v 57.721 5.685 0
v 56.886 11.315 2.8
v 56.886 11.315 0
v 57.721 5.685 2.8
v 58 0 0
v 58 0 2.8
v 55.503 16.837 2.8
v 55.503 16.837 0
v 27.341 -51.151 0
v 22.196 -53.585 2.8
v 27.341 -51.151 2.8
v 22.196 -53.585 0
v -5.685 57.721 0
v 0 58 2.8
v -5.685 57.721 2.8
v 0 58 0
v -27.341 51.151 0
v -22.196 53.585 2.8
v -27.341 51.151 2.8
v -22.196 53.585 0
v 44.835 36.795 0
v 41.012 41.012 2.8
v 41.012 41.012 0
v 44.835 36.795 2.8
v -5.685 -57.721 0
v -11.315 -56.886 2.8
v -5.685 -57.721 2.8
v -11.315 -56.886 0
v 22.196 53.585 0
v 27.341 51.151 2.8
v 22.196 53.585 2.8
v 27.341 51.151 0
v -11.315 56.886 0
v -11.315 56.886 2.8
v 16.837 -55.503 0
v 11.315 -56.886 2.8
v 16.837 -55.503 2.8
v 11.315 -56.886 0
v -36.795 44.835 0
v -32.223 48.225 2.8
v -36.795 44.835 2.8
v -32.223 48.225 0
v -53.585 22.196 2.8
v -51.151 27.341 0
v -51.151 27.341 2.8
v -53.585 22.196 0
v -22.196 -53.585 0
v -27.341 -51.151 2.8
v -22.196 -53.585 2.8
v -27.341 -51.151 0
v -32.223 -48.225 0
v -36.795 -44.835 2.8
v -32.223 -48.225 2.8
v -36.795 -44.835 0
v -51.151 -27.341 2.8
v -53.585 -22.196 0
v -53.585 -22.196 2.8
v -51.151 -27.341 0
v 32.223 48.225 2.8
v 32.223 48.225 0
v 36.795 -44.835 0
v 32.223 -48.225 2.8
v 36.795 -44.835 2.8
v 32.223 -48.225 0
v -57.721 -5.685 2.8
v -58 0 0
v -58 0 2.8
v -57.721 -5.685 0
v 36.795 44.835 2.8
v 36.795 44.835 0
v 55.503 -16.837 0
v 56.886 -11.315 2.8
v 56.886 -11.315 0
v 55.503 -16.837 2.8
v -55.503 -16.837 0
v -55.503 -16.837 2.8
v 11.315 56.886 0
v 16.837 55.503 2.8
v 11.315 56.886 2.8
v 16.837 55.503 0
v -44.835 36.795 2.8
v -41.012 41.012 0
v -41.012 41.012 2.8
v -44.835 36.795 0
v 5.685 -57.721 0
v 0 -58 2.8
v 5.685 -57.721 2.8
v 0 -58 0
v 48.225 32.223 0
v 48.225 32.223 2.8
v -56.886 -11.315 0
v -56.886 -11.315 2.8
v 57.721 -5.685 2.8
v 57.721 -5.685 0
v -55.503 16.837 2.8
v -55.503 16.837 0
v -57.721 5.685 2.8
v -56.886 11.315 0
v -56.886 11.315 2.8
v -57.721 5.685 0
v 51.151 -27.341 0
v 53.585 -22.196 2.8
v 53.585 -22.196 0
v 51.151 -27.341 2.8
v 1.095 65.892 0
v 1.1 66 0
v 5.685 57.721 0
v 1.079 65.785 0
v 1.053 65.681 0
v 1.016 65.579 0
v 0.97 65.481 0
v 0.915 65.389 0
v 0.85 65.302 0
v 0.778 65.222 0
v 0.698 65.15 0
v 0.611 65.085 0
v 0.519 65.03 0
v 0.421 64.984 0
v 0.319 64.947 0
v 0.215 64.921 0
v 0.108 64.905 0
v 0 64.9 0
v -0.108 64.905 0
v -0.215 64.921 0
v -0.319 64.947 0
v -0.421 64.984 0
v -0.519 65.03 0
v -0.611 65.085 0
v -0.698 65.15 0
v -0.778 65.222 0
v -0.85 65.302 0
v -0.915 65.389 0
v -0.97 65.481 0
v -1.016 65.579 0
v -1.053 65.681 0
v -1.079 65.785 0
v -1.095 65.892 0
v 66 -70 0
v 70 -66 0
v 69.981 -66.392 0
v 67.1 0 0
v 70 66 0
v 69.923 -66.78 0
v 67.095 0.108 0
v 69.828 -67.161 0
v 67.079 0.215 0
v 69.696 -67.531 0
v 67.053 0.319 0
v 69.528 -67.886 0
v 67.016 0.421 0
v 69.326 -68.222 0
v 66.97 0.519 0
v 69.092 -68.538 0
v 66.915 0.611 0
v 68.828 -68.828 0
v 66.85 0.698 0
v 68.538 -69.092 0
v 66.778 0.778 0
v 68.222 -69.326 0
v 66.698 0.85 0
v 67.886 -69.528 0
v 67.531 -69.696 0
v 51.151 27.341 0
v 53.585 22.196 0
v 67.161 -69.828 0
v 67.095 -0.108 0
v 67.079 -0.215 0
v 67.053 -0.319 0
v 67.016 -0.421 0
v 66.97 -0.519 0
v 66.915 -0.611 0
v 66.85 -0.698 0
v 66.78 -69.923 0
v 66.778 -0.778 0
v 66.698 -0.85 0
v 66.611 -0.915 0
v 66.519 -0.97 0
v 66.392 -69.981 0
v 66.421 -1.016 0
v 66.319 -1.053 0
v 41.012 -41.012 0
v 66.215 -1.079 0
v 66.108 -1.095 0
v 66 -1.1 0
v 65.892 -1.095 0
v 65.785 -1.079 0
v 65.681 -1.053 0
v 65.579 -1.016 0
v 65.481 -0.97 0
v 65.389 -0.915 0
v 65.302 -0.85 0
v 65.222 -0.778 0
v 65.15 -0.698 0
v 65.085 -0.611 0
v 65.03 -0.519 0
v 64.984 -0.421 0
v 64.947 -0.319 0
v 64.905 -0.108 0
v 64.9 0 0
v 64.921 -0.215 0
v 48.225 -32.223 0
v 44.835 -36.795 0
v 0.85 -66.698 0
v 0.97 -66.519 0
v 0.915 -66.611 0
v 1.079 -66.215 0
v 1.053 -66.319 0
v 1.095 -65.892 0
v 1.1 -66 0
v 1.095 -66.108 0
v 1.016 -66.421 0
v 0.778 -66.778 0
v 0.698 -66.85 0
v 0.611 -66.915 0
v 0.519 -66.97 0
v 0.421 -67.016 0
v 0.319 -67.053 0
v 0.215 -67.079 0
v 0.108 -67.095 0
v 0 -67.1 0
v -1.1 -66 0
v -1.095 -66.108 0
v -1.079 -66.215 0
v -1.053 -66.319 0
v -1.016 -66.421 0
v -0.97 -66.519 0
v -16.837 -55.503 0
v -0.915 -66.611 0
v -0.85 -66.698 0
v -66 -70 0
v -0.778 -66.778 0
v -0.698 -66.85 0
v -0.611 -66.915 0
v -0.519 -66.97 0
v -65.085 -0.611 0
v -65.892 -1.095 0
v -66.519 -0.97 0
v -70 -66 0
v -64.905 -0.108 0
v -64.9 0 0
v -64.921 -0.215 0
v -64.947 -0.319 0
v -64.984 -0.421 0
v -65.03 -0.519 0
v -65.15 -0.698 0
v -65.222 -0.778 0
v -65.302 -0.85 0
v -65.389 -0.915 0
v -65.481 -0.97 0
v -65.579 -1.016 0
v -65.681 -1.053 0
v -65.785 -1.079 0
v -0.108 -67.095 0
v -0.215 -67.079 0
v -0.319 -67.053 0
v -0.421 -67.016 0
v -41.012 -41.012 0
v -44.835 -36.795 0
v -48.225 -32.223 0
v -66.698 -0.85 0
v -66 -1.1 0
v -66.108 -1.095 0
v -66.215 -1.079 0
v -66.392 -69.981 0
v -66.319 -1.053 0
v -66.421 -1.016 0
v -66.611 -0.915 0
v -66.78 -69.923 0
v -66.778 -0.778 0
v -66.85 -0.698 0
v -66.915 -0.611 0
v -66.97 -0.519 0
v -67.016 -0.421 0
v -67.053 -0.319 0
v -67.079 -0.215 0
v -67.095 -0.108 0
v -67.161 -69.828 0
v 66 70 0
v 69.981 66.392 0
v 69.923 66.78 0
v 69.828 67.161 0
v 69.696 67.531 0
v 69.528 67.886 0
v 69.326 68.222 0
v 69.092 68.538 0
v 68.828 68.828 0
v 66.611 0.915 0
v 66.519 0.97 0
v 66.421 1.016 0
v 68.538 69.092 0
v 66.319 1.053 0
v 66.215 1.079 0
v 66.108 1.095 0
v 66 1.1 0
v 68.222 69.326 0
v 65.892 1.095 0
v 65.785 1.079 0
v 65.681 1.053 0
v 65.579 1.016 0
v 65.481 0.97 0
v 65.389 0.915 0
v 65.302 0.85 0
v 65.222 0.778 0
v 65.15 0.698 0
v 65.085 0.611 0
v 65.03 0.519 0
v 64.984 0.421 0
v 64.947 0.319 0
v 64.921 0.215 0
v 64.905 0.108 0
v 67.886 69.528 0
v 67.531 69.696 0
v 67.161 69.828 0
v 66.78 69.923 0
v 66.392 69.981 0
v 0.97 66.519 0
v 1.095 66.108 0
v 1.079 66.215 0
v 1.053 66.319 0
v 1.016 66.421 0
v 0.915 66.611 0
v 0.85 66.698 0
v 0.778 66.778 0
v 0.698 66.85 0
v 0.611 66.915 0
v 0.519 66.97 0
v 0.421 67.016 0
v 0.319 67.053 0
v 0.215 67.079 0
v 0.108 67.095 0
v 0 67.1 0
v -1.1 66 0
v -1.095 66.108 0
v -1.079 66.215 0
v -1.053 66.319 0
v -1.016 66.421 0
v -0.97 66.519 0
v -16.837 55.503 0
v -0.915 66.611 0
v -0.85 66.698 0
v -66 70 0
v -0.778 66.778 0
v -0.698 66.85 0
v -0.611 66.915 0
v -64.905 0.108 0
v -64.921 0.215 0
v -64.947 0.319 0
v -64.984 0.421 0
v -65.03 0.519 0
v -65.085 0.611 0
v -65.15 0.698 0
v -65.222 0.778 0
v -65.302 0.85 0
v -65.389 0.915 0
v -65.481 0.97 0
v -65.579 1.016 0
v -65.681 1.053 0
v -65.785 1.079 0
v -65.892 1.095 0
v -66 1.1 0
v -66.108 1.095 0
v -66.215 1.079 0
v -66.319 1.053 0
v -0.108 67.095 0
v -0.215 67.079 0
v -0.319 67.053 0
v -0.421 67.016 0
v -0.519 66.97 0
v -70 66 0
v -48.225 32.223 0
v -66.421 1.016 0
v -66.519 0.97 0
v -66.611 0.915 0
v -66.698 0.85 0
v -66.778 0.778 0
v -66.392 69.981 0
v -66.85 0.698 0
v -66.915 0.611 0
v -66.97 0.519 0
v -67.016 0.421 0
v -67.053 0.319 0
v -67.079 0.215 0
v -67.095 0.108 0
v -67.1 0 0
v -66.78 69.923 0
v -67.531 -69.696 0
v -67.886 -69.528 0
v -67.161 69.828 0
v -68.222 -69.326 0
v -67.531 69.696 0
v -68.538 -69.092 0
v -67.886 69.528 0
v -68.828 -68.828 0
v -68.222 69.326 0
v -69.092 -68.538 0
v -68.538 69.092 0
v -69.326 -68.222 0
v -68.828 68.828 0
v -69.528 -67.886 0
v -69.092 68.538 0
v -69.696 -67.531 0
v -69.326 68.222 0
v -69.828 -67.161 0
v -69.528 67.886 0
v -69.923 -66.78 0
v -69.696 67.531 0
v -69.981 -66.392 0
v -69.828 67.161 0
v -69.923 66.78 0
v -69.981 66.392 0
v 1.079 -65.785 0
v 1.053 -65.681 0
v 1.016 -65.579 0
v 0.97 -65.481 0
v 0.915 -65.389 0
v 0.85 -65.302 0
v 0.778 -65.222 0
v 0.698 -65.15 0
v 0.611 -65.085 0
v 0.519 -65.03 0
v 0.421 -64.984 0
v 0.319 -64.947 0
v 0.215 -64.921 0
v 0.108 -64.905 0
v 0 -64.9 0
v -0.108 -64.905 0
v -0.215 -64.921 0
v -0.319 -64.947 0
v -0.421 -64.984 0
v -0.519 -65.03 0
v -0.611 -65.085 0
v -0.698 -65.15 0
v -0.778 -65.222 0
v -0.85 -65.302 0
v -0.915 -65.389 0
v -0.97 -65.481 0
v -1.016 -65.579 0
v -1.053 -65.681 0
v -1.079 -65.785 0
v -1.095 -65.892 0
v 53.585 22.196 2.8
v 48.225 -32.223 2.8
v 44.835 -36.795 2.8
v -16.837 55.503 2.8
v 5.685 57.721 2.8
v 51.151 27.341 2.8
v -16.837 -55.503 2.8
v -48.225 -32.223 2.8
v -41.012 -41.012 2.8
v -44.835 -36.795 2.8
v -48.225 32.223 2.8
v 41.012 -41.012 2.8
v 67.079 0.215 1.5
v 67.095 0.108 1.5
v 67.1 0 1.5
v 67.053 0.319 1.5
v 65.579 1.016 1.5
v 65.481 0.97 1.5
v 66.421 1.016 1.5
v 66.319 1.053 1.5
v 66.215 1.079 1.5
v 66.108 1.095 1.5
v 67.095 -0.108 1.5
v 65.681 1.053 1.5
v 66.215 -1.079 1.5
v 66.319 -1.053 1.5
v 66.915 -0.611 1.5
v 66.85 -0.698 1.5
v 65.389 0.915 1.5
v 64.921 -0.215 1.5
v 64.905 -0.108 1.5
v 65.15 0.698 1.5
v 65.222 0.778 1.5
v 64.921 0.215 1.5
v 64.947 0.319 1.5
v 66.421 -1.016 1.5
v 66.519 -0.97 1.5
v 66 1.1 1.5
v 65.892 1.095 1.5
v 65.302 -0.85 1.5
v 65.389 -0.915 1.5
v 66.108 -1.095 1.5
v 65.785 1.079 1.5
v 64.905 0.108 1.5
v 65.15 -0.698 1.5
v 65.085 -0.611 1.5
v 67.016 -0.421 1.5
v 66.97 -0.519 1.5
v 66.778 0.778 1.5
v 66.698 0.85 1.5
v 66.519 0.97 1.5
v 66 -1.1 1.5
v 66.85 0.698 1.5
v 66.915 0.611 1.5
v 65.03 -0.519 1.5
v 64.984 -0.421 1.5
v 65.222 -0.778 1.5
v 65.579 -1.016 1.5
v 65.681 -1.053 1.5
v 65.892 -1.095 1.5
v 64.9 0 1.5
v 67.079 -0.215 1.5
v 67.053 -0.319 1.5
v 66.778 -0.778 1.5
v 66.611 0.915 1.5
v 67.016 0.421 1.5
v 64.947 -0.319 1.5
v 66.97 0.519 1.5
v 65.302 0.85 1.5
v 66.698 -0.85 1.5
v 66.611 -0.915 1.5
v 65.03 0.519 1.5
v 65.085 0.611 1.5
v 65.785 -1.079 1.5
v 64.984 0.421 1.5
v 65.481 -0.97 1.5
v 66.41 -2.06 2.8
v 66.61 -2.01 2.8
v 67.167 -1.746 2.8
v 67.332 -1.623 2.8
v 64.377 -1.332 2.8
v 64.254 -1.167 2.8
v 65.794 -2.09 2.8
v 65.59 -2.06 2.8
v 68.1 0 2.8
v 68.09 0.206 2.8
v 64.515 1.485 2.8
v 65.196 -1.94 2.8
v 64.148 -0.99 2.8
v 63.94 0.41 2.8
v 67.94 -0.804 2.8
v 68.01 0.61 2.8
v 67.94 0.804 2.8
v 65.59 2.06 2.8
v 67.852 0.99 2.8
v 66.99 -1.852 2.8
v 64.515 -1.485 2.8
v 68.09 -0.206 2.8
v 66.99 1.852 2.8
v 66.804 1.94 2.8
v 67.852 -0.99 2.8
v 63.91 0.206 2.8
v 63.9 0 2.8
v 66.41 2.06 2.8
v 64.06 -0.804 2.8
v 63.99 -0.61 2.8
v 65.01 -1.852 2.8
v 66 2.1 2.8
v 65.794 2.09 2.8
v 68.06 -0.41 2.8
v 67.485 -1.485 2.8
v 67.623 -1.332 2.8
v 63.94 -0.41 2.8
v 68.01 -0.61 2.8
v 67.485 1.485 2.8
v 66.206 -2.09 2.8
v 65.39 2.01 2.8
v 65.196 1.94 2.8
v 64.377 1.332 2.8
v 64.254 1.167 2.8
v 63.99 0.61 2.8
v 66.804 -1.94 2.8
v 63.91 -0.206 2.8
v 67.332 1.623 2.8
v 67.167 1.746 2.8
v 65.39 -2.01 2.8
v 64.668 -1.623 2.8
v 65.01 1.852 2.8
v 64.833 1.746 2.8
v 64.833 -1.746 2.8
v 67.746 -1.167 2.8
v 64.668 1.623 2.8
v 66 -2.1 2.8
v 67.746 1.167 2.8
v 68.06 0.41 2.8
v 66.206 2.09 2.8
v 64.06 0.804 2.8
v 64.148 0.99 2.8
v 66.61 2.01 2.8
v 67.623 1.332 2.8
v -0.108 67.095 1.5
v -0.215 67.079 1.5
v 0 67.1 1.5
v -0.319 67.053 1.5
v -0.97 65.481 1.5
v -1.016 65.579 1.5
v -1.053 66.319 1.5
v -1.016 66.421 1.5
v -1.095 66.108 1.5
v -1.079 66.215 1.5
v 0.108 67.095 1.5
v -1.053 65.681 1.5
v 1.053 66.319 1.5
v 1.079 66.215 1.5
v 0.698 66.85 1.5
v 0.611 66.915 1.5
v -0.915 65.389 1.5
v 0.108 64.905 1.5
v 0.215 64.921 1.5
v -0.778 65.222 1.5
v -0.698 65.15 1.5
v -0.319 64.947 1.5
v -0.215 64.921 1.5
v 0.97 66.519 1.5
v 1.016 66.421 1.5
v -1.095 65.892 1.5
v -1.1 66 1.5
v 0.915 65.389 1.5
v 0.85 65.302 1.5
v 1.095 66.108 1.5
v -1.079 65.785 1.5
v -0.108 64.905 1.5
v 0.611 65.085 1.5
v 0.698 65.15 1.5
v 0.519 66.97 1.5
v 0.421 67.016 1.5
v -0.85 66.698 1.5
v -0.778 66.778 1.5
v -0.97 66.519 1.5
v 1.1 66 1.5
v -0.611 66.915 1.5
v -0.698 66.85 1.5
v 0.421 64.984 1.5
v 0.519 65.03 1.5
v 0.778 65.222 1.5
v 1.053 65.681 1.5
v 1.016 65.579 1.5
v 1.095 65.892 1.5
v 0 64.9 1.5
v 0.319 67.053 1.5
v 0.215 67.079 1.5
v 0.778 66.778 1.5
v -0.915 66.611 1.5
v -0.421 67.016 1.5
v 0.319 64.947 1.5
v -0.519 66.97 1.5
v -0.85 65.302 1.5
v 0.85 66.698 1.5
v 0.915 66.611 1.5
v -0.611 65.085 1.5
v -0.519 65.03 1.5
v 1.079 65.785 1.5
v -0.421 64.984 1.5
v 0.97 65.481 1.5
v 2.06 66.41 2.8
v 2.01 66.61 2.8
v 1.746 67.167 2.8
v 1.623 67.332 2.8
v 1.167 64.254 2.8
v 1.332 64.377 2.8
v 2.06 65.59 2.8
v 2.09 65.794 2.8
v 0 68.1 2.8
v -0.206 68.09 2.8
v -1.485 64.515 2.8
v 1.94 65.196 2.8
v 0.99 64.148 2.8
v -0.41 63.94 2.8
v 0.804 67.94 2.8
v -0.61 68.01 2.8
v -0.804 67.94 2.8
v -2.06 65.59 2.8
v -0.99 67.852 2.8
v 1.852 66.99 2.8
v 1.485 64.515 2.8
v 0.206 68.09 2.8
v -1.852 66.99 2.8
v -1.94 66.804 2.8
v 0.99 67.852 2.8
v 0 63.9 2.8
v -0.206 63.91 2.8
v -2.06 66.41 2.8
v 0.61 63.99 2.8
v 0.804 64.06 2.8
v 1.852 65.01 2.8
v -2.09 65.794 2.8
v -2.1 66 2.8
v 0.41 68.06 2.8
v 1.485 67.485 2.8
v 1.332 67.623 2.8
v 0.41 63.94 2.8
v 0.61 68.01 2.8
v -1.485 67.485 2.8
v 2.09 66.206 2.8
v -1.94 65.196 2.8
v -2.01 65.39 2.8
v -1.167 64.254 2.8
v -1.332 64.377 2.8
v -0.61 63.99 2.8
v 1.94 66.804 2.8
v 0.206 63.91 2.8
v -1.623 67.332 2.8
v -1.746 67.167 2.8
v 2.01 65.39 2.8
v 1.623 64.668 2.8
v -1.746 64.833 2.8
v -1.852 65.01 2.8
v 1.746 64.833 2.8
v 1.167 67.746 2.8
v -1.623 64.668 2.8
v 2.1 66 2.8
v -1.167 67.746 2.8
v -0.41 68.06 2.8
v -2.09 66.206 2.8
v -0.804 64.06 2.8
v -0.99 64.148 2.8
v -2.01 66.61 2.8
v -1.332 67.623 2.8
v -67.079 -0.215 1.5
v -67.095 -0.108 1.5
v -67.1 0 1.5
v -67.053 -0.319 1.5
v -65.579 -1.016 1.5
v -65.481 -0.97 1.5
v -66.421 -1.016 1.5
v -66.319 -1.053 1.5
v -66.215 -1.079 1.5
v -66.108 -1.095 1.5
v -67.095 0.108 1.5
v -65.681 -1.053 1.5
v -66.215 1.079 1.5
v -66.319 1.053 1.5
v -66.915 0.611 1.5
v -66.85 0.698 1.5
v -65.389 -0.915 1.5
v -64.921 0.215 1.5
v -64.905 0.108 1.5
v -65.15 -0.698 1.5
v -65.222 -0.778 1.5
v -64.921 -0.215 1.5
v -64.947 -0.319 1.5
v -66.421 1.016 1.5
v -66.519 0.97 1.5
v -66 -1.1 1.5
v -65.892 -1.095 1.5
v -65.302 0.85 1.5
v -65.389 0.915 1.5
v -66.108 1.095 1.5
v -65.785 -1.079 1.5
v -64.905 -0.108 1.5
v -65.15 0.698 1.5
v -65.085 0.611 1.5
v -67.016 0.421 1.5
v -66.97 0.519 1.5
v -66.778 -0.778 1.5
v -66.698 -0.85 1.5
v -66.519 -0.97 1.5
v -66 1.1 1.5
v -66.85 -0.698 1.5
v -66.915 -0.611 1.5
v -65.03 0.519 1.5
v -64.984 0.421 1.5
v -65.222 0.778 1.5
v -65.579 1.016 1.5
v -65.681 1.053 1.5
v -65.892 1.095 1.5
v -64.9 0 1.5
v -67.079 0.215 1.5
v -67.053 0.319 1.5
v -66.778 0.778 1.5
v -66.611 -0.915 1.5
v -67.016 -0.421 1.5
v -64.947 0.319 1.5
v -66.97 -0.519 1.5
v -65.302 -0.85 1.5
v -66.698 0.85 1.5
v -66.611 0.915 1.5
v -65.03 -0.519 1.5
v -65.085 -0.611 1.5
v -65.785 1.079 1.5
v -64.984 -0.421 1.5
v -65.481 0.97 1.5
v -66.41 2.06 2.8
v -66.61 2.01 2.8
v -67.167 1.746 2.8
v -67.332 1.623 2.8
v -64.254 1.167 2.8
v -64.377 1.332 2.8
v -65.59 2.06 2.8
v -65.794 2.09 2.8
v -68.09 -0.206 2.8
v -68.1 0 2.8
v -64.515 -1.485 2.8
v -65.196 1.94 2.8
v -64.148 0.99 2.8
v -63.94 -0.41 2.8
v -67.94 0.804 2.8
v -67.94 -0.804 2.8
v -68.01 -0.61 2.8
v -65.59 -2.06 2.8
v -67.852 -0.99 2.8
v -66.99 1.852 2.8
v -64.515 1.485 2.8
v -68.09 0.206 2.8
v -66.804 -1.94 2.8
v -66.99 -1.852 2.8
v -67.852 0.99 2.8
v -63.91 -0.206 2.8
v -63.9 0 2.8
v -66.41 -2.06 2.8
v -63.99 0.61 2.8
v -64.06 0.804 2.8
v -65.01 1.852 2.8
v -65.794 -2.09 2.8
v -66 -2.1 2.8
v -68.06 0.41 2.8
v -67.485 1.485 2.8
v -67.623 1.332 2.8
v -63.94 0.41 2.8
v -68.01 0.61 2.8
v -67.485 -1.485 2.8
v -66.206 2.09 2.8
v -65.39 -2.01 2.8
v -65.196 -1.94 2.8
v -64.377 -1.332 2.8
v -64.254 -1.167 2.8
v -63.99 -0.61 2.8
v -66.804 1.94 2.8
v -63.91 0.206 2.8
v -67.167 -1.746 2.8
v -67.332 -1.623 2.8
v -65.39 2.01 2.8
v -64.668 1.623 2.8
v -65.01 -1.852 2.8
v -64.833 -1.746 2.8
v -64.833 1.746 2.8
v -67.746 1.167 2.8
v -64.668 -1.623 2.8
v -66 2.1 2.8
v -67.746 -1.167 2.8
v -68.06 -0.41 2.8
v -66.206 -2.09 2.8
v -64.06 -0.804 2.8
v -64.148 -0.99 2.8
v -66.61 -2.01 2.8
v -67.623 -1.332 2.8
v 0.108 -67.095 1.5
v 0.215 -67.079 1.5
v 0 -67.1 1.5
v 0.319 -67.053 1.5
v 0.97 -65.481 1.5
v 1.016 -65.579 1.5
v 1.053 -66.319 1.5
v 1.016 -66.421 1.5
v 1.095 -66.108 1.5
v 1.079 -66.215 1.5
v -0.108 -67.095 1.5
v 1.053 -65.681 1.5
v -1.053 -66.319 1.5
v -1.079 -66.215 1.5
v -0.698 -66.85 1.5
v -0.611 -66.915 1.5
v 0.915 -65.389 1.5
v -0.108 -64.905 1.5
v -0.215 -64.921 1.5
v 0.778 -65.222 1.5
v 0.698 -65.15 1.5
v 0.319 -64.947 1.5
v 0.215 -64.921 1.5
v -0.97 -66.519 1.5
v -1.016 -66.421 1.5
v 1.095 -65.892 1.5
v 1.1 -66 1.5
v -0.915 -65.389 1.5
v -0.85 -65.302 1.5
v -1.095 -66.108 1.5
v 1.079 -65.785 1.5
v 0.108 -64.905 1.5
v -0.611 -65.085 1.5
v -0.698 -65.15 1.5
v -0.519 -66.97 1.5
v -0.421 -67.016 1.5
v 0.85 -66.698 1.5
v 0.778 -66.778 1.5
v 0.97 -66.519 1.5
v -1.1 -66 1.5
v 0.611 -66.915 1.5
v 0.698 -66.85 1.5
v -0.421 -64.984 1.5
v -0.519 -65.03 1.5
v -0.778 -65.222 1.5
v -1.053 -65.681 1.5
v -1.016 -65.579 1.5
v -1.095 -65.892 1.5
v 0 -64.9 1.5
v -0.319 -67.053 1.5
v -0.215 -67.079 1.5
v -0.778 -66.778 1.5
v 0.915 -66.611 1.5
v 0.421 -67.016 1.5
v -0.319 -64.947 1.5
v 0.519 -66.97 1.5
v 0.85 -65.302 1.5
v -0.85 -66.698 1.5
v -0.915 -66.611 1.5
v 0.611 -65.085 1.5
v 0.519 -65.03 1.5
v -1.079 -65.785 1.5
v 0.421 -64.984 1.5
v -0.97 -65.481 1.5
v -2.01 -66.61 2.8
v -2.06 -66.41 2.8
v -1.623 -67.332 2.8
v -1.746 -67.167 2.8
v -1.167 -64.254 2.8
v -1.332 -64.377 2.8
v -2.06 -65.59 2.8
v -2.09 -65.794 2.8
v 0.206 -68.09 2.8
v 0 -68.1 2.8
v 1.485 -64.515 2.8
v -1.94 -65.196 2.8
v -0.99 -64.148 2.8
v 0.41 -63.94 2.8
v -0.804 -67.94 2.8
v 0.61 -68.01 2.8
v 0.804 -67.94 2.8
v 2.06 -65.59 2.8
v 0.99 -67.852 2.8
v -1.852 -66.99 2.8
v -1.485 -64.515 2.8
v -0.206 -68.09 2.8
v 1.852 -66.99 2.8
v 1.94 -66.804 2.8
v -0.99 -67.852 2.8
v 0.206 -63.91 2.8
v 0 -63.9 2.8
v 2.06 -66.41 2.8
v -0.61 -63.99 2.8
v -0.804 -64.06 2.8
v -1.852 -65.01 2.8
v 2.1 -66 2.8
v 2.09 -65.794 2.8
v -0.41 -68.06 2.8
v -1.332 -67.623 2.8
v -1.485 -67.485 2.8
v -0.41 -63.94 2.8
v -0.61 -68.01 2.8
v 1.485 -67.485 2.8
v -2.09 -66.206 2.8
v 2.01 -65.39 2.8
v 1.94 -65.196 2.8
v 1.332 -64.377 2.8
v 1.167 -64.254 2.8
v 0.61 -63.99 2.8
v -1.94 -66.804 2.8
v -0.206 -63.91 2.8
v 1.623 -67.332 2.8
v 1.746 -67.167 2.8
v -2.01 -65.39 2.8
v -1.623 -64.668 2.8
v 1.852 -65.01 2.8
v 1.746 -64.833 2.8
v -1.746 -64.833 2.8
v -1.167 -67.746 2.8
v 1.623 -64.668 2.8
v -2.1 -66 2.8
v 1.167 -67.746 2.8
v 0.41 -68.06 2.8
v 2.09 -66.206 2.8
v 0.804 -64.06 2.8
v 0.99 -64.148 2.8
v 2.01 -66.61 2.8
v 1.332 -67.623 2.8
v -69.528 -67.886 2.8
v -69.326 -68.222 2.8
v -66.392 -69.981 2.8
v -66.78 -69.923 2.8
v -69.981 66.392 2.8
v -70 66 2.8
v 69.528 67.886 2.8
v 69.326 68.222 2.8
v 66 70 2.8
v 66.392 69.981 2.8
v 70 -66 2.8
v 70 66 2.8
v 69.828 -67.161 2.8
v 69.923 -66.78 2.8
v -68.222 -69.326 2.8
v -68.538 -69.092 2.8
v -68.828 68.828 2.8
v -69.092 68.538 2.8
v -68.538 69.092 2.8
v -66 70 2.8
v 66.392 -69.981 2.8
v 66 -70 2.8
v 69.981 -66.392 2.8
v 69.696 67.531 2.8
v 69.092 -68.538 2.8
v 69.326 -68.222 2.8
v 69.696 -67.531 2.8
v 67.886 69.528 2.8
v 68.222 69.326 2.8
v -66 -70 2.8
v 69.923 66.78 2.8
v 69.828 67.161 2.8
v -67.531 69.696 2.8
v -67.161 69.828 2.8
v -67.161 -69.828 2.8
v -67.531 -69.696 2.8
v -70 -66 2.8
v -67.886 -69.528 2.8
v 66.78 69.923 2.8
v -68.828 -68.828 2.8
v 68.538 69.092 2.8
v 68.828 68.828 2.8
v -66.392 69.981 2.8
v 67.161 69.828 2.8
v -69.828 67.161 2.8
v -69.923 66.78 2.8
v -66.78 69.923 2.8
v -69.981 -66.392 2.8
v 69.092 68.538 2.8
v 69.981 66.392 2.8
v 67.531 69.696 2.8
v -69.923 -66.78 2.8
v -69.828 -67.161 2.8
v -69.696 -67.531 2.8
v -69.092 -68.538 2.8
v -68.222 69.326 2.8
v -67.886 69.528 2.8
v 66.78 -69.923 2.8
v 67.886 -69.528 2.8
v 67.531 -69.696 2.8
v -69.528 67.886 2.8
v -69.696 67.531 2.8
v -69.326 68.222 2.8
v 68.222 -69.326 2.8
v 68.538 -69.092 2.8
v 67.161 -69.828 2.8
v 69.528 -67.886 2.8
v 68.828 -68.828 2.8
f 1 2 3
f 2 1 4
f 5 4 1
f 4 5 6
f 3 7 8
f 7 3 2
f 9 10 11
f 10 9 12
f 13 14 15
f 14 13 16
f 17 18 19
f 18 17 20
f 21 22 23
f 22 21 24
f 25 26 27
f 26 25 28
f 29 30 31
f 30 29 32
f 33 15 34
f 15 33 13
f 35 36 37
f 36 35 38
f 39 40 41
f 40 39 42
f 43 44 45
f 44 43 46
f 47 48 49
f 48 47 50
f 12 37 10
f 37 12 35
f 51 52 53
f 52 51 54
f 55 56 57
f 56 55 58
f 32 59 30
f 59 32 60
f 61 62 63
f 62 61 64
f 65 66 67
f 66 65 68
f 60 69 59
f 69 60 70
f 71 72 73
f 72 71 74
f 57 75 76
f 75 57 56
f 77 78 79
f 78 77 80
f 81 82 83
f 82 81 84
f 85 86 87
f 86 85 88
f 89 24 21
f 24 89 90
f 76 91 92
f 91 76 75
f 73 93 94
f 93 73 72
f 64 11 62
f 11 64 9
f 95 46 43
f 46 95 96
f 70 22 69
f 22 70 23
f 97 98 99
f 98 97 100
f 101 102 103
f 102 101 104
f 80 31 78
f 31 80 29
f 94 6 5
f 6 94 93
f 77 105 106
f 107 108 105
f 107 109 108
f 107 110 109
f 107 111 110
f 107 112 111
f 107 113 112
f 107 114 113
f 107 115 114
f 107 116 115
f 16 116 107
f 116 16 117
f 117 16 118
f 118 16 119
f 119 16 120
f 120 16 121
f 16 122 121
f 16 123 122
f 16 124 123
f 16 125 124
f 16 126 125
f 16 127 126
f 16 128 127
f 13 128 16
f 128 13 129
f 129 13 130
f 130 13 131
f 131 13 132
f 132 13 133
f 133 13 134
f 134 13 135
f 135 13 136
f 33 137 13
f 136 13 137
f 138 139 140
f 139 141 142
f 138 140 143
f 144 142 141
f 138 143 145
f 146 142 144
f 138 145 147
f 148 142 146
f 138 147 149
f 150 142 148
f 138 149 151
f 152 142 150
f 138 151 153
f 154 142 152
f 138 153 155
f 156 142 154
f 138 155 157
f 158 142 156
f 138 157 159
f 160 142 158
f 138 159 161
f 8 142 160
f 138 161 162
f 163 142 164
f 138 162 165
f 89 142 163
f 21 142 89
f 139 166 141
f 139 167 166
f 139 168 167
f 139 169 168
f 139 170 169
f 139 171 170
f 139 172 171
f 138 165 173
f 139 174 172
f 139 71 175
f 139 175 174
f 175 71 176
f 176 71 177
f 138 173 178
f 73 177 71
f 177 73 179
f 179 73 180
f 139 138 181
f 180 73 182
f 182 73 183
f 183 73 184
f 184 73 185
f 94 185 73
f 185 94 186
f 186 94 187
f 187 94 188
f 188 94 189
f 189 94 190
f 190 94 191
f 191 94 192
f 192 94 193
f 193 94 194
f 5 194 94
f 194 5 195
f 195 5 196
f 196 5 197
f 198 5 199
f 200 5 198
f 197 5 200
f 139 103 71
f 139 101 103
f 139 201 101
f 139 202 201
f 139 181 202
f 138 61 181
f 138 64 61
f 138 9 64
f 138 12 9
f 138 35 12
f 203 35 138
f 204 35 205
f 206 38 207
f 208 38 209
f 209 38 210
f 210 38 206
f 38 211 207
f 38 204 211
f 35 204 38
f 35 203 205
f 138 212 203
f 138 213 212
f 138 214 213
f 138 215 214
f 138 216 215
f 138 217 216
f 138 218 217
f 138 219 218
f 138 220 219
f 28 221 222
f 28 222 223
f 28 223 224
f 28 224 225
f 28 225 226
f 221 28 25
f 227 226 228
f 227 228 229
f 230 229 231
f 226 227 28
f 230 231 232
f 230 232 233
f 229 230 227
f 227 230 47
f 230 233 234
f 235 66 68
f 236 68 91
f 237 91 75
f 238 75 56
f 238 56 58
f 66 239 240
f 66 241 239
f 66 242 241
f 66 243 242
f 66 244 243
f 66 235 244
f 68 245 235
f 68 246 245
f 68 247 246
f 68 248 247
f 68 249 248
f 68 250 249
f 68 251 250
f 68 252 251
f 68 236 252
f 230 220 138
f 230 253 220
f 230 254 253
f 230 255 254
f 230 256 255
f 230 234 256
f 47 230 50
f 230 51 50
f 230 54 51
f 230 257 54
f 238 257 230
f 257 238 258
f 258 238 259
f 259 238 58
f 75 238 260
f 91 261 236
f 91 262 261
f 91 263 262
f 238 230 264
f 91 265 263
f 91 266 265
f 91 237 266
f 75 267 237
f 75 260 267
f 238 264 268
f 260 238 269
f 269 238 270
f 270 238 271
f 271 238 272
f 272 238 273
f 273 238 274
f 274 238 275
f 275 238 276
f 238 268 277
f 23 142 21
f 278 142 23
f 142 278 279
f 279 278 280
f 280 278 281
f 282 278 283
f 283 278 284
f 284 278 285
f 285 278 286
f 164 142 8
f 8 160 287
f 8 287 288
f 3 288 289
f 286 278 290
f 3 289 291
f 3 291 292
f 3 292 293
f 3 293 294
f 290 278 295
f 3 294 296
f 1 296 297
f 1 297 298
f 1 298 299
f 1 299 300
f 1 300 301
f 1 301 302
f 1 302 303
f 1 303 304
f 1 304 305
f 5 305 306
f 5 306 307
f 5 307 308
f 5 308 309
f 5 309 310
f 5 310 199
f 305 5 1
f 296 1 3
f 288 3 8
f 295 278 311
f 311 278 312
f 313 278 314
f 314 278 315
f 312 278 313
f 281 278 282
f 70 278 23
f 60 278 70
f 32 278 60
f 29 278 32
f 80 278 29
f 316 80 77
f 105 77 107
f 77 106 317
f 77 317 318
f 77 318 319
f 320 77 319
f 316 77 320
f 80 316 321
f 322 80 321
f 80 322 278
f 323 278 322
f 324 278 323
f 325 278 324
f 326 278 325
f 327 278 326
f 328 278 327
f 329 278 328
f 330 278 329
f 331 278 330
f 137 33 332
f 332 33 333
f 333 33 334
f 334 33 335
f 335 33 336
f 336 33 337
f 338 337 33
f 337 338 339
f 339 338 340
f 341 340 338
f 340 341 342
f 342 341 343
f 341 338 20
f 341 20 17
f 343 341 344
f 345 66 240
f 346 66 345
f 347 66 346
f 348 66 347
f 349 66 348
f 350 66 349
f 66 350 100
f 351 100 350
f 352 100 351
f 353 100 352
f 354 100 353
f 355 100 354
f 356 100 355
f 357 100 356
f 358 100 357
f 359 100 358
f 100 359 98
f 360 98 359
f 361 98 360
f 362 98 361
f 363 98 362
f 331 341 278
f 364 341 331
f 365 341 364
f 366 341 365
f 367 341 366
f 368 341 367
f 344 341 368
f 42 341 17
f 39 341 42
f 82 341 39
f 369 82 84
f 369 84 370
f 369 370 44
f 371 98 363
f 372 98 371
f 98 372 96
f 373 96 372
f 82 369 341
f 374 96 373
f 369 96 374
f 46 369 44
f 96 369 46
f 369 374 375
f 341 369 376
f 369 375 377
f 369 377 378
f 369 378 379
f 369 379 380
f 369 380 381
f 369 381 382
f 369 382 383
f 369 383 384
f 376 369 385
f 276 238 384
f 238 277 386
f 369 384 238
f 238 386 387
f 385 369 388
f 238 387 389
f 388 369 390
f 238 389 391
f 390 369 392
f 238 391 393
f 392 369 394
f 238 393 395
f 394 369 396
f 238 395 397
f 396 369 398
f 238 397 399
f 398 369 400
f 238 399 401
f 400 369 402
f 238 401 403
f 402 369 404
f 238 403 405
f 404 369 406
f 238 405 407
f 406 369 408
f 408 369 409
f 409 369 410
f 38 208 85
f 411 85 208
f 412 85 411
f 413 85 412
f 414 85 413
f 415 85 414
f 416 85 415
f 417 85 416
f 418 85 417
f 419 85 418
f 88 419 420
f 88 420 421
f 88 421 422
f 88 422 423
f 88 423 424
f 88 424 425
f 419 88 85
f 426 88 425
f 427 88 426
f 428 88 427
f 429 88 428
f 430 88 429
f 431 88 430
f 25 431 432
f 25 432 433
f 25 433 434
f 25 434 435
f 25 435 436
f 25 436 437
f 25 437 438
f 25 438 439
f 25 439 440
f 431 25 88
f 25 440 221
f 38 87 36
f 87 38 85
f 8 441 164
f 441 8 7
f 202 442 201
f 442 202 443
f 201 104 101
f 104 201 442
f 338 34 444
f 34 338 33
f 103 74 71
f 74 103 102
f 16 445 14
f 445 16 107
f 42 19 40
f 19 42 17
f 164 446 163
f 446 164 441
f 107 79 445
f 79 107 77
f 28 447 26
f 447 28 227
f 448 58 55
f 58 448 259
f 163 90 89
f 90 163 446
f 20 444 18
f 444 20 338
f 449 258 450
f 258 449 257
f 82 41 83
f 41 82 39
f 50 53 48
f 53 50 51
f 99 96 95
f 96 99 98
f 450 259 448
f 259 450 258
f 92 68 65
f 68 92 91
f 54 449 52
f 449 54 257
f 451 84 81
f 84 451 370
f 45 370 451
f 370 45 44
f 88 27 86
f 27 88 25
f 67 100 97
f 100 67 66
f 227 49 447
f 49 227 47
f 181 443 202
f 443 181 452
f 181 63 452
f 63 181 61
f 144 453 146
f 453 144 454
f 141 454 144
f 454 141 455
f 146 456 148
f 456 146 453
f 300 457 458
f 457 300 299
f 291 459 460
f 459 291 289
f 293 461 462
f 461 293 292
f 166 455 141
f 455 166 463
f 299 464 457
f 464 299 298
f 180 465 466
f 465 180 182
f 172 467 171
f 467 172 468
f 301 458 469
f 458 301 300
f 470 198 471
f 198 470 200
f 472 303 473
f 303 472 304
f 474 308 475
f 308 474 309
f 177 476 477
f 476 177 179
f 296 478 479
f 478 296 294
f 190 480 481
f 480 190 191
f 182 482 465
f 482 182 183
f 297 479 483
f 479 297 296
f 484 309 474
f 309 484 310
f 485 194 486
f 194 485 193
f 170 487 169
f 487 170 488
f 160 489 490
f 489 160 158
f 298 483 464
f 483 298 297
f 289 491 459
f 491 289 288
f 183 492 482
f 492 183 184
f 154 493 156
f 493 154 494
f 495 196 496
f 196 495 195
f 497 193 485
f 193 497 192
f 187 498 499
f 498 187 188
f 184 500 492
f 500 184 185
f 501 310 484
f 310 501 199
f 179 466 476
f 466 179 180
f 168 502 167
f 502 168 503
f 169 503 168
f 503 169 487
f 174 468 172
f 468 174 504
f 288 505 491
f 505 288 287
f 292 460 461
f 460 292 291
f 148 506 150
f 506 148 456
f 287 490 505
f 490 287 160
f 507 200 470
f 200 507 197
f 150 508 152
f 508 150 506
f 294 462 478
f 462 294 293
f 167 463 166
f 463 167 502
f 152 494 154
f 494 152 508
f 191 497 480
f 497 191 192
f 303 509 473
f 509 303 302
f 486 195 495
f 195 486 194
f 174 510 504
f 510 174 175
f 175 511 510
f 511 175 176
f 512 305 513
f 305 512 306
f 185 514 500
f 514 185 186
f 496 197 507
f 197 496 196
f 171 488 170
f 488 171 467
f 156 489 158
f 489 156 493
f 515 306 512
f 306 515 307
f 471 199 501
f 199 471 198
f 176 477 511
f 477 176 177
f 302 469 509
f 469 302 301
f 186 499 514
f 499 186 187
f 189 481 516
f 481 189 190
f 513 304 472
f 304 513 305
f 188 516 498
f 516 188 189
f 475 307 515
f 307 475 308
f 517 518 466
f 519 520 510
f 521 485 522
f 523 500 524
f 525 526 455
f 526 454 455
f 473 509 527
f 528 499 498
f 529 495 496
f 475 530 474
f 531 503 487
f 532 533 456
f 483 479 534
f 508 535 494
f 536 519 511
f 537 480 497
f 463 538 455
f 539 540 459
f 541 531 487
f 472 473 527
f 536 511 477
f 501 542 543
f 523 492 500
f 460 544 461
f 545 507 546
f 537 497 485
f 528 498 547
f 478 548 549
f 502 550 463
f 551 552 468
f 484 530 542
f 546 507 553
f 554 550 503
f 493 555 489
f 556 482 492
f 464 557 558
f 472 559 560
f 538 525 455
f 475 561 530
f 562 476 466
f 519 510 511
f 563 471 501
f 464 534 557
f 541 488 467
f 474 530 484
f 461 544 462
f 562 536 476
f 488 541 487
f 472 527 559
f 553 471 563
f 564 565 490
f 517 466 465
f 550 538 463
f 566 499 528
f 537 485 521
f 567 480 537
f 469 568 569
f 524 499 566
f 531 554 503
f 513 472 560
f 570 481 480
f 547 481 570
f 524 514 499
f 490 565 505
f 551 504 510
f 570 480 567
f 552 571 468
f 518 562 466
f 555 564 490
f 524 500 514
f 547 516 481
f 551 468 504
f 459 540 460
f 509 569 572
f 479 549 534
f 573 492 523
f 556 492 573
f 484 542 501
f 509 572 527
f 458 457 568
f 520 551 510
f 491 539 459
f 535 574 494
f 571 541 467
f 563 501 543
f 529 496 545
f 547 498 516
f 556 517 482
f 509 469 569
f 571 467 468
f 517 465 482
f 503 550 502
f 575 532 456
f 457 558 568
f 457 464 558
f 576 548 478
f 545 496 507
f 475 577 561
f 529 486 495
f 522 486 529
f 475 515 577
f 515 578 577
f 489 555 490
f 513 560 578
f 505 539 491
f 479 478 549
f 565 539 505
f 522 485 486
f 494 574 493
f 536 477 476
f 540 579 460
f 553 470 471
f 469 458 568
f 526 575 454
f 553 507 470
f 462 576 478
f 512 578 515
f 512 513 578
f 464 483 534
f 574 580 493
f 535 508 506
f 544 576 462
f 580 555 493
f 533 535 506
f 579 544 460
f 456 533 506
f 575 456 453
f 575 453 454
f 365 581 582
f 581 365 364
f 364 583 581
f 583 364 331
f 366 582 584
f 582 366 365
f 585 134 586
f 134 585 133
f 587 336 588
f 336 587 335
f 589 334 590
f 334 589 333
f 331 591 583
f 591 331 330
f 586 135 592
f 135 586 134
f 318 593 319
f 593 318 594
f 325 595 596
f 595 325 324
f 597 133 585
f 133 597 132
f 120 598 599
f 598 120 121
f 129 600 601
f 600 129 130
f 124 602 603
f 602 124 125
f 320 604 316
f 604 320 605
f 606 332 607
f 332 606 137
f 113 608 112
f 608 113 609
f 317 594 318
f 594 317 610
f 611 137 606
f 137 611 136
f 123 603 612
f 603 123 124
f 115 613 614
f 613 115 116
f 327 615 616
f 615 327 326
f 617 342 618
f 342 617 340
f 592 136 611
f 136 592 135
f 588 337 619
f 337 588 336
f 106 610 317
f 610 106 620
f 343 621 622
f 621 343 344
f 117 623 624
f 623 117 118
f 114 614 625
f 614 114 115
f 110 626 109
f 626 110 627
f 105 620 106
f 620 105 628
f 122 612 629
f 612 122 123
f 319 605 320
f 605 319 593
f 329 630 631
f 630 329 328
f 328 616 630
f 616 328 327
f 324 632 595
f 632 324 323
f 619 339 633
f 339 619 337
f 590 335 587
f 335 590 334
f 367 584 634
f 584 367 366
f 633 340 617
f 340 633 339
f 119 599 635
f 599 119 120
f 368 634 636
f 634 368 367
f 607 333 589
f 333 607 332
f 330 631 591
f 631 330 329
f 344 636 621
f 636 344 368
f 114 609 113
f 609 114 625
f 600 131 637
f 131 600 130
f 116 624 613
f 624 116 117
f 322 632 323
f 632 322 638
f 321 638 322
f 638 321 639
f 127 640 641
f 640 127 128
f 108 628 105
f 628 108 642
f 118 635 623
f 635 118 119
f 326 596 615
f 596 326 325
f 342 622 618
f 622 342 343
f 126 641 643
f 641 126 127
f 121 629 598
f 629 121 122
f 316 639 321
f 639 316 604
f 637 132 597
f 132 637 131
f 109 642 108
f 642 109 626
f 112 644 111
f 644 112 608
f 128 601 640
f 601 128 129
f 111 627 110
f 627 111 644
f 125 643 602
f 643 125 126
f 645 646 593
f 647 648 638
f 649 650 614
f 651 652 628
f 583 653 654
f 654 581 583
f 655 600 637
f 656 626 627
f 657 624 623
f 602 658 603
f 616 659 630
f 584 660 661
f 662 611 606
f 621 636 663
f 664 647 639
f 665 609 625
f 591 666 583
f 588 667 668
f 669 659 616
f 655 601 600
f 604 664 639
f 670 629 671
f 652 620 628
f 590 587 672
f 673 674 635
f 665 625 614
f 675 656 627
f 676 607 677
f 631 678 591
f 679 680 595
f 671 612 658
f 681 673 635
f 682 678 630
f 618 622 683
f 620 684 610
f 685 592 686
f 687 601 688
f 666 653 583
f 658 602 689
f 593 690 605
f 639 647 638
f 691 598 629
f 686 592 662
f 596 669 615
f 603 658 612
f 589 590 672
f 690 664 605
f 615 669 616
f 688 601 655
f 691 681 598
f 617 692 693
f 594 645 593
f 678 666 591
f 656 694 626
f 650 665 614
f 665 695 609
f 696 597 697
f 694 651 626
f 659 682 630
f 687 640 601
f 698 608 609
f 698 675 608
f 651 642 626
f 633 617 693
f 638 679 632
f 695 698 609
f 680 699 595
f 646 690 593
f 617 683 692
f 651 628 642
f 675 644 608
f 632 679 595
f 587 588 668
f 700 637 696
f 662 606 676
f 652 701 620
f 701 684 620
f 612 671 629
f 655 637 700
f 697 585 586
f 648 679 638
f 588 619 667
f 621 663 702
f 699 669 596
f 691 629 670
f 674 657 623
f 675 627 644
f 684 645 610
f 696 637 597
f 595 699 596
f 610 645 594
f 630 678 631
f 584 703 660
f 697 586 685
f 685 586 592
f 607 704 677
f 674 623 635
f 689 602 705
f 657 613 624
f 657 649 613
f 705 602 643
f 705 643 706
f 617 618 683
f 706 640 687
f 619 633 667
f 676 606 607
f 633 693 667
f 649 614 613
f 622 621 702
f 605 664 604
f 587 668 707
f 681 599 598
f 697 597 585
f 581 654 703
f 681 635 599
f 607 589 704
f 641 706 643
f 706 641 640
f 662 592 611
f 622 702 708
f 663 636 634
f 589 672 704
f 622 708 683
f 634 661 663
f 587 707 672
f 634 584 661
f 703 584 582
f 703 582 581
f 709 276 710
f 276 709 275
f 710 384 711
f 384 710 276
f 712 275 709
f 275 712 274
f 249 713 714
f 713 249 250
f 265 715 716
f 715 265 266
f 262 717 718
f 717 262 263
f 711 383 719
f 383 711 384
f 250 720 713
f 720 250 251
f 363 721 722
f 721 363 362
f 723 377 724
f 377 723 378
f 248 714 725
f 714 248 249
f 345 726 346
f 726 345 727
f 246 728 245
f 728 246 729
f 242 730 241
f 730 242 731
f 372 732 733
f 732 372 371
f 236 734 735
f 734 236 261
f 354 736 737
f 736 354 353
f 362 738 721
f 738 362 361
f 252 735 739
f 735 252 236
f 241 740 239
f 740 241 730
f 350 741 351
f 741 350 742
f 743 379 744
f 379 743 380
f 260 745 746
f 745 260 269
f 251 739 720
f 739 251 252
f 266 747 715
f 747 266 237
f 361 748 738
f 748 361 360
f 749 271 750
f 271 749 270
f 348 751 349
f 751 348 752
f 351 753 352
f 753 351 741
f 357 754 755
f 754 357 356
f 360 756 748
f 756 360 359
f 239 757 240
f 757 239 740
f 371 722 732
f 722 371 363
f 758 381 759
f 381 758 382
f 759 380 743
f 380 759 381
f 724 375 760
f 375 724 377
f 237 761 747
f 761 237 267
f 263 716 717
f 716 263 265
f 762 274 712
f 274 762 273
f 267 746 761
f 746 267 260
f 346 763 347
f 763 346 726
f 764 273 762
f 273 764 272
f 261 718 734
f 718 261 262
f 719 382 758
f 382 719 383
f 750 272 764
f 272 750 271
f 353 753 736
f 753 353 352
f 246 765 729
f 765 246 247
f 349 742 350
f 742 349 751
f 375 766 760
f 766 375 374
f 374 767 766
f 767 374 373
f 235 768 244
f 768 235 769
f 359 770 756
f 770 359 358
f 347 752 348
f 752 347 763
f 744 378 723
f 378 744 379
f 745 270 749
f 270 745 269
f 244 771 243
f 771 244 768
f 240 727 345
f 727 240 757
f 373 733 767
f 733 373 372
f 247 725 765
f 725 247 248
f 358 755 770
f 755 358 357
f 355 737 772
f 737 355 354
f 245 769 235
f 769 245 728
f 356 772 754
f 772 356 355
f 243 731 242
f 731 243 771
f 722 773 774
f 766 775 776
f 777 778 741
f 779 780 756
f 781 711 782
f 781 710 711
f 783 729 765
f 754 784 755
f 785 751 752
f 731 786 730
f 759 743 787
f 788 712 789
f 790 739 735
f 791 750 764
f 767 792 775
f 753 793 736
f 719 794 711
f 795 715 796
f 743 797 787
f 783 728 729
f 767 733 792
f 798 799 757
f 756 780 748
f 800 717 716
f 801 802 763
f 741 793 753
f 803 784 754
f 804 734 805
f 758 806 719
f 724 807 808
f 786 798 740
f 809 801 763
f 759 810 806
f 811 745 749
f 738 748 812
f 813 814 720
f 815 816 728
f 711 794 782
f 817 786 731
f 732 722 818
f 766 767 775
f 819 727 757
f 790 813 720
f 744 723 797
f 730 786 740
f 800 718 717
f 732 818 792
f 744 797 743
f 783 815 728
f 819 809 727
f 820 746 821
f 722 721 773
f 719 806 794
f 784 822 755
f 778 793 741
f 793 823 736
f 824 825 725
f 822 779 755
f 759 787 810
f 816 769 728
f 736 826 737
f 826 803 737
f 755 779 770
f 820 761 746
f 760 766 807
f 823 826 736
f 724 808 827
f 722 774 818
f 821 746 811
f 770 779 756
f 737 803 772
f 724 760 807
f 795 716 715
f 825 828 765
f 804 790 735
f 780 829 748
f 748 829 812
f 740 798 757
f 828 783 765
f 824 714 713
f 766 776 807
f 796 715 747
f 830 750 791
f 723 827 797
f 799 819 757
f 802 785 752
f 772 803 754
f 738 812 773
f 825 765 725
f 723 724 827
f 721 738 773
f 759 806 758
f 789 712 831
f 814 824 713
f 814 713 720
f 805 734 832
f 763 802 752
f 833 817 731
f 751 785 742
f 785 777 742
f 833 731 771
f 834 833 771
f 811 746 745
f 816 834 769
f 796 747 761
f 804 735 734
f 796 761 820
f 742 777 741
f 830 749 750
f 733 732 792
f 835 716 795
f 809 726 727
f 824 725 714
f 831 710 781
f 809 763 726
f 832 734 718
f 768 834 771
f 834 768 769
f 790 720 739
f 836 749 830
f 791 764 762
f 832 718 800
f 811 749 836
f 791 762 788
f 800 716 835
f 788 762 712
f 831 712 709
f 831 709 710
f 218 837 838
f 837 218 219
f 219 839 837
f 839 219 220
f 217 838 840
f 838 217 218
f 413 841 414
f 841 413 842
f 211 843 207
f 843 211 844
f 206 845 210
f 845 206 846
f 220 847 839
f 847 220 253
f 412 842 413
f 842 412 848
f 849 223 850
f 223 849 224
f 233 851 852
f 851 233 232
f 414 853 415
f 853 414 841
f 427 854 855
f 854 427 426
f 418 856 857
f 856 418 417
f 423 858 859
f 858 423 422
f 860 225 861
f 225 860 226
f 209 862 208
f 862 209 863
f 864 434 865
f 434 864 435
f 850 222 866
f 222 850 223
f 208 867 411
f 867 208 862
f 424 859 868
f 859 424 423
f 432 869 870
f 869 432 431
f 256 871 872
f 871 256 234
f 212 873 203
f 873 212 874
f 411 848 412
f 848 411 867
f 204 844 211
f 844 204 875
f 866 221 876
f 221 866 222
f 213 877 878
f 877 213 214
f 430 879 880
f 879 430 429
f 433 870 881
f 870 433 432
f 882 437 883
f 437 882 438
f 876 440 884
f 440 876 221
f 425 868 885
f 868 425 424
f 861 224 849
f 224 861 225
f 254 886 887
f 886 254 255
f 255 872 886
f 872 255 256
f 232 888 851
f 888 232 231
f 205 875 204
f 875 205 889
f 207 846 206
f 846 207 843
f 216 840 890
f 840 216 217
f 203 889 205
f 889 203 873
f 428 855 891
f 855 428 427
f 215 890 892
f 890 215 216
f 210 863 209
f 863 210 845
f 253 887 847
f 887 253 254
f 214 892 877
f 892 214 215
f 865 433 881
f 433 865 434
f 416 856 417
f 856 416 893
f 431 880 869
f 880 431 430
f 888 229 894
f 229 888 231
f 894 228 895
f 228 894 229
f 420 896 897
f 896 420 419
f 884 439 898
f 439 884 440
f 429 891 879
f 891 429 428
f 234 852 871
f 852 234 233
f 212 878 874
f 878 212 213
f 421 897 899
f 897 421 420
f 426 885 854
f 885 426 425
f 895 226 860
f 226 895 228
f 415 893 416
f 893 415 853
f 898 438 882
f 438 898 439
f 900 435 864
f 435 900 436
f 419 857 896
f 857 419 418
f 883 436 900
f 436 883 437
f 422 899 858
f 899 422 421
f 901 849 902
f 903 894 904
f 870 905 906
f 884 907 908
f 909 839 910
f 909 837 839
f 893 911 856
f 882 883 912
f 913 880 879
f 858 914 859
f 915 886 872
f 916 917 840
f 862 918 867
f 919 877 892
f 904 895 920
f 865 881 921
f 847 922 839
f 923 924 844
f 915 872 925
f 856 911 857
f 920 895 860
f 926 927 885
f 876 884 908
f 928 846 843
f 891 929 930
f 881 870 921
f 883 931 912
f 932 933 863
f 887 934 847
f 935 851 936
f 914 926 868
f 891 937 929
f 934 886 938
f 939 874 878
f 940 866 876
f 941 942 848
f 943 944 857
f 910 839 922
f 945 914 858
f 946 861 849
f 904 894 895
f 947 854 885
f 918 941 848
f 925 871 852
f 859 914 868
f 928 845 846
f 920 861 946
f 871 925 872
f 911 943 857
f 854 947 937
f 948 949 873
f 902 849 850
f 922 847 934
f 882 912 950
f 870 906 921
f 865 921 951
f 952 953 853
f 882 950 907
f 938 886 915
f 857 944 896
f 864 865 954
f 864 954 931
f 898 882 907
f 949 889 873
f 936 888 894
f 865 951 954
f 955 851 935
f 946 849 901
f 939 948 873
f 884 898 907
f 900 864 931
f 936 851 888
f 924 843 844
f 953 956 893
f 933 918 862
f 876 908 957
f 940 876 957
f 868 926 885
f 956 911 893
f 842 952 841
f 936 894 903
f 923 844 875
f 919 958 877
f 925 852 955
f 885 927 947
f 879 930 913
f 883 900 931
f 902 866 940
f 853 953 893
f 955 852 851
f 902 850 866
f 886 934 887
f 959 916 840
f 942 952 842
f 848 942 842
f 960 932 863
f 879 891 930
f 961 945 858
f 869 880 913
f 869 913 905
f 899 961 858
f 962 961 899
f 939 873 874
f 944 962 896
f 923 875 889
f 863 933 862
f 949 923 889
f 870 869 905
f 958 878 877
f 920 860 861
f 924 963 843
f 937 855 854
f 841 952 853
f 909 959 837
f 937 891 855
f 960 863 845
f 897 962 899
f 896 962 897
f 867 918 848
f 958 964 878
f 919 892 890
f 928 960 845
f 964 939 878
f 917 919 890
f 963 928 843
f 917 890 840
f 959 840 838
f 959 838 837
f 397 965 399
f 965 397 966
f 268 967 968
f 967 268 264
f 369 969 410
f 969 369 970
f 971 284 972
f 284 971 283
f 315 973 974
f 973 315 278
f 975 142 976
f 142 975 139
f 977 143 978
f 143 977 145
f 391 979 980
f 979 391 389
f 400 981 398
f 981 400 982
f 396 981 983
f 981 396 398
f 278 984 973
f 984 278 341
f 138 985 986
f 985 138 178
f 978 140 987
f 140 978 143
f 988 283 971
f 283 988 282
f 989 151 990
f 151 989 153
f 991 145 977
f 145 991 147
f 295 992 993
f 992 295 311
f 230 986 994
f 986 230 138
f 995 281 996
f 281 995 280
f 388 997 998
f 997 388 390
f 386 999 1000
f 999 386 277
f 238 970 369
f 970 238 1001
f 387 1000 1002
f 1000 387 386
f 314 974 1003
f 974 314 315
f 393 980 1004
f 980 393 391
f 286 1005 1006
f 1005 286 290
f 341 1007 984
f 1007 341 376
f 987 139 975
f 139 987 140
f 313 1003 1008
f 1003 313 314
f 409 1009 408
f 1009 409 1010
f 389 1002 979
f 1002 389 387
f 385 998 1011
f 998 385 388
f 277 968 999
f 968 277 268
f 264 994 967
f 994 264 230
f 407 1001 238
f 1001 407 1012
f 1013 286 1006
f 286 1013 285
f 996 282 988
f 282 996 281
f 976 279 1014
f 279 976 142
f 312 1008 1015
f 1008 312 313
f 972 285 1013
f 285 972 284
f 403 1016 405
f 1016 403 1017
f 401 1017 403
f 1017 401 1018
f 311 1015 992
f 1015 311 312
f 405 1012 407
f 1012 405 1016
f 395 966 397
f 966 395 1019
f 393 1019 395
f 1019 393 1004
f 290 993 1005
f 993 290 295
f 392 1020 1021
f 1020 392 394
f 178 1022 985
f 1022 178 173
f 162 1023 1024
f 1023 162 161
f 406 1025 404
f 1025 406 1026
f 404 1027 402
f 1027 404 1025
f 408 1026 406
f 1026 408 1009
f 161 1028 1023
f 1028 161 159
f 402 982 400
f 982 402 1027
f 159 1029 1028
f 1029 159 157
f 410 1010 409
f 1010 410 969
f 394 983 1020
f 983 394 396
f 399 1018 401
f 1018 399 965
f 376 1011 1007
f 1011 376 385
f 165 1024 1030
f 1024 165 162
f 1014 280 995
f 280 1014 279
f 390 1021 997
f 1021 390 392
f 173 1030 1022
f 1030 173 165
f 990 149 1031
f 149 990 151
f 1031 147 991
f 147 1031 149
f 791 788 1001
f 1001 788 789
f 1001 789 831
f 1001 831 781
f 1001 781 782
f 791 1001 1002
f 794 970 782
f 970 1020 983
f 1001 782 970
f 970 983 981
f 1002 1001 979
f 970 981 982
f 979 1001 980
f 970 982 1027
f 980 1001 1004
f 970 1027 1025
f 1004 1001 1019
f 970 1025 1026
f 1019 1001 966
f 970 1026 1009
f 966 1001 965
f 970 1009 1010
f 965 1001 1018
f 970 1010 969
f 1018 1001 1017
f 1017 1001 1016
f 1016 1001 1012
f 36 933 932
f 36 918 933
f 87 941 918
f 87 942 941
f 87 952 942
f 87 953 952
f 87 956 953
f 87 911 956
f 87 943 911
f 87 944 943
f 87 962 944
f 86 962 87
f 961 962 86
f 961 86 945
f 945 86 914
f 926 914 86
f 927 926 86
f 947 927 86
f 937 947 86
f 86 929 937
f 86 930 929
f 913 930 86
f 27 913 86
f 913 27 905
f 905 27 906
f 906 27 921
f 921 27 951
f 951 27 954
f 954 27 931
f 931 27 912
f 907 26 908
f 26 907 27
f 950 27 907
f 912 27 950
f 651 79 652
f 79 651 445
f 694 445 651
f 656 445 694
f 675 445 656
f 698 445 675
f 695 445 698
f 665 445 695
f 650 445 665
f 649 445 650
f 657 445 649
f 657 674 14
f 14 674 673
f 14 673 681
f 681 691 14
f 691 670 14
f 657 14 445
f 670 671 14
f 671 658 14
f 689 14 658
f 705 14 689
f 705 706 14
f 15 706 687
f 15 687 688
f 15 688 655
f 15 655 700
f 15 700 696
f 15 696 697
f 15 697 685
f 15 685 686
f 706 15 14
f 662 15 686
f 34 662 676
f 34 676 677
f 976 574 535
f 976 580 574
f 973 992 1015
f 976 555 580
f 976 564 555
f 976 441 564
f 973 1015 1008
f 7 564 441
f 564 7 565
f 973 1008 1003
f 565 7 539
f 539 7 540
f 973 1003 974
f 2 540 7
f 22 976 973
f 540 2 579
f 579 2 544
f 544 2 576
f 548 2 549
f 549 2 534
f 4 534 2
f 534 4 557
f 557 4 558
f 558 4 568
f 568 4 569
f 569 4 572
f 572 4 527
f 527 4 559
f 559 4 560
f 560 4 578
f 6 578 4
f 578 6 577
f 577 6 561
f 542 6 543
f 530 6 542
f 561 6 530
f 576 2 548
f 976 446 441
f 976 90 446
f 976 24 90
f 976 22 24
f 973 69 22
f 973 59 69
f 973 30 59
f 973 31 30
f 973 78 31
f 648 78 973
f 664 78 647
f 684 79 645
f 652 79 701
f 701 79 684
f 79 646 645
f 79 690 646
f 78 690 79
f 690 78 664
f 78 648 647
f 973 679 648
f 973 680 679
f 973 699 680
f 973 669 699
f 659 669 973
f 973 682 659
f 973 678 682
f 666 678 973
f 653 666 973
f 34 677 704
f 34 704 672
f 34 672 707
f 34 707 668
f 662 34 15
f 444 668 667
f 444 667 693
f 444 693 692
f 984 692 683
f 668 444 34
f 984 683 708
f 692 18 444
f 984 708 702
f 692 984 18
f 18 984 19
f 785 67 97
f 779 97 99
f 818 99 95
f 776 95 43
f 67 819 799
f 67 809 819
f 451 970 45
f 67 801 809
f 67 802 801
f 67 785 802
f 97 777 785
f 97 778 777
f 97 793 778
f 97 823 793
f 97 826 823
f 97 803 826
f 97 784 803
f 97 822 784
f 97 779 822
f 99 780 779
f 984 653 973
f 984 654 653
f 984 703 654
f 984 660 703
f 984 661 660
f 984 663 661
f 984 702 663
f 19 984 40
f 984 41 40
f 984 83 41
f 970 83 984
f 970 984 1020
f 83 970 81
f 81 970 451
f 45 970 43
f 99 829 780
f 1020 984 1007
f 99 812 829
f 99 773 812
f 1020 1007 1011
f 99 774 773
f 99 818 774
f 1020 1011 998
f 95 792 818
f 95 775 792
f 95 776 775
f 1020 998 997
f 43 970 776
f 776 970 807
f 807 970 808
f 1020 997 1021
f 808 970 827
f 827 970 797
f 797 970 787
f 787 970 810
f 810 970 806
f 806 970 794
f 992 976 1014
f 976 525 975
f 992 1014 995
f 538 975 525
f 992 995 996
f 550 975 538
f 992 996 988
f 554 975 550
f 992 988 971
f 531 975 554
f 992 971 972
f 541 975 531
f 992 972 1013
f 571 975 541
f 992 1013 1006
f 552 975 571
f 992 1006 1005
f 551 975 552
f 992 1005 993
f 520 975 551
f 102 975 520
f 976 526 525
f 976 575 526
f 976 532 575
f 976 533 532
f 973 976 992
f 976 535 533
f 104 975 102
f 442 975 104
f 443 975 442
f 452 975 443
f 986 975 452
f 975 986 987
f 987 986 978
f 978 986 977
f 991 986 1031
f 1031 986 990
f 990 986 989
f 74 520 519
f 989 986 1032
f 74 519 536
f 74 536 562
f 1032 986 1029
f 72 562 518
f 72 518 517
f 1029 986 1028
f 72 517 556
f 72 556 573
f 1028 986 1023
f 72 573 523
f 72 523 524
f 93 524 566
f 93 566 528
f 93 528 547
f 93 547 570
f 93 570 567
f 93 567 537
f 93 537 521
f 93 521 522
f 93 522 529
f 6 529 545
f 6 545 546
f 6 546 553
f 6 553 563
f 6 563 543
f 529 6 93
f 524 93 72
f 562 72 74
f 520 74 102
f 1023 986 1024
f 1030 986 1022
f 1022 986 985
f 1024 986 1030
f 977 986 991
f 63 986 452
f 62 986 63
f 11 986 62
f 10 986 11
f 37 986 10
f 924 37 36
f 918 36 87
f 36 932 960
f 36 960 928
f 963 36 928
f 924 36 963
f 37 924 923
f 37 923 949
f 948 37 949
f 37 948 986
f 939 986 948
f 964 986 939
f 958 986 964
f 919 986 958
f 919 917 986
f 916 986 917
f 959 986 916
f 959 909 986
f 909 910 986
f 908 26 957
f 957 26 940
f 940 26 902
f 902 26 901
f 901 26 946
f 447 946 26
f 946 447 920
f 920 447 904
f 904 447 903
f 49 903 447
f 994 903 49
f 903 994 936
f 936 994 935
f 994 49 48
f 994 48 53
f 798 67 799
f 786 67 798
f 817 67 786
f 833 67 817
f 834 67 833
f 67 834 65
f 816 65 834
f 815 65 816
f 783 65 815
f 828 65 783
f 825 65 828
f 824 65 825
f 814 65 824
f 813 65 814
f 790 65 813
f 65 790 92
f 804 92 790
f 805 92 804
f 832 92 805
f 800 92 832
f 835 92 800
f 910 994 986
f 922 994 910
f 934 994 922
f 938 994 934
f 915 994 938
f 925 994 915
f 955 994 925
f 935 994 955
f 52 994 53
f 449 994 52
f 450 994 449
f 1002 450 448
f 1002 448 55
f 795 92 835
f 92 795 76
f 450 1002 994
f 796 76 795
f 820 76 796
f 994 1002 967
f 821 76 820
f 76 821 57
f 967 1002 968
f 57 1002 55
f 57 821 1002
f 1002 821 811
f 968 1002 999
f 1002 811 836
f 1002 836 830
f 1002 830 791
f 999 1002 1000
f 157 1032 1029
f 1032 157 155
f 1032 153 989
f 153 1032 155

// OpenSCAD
// Removable Faceplate for 120mm Noctua Fan Housing
// Secured with 4x M2 screws + M2 nuts (nuts sit in hex pockets in the housing)
// Units: mm
// Matches fan_housing.scad

/* [Parameters – keep in sync with housing] */
outer_width = 140;          // MUST match fan_housing.scad
faceplate_thickness = 2.8;
fan_size = 120;
grille_margin = 8;              // how much solid border around the grille
faceplate_screw_offset = 66;    // MUST match housing (cardinal points now)
m2_clearance_d = 2.2;           // clearance hole for M2 screw
use_countersink = true;
countersink_d = 4.2;
countersink_depth = 1.2;

$fn = 64;

module faceplate() {
    difference() {
        // Outer plate – slightly smaller than housing for flush look, or match for flush
        hull() {
            for (x = [-1,1])
                for (y = [-1,1])
                    translate([x*(outer_width/2 - 4), y*(outer_width/2 - 4), 0])
                        cylinder(d=8, h=faceplate_thickness);
        }
        
        // Main airflow opening (slightly smaller than fan for safety)
        translate([0,0,-1])
            cylinder(d=fan_size - 6, h=faceplate_thickness + 2);
        
        // Protective but high-airflow grille: outer ring + 3 concentric rings + 6 spokes
        // Outer safety ring
        difference() {
            cylinder(d=fan_size - 4, h=faceplate_thickness + 1);
            cylinder(d=fan_size - 10, h=faceplate_thickness + 2);
        }
        // Inner rings
        for (r = [22, 38, 52]) {
            difference() {
                cylinder(d=r*2 + 2.5, h=faceplate_thickness + 1);
                cylinder(d=r*2 - 2.5, h=faceplate_thickness + 2);
            }
        }
        // Spokes
        for (a = [0 : 30 : 150]) {
            rotate([0,0,a])
                translate([0, 0, faceplate_thickness/2])
                    cube([fan_size - 12, 1.8, faceplate_thickness + 1], center=true);
        }
        
        // M2 clearance holes (cardinal points - must match housing)
        for (a = [0, 90, 180, 270]) {
            rotate([0,0,a])
                translate([faceplate_screw_offset, 0, -0.1]) {
                    cylinder(d=m2_clearance_d, h=faceplate_thickness + 1);
                    if (use_countersink)
                        translate([0,0,faceplate_thickness - countersink_depth])
                            cylinder(d1=m2_clearance_d, d2=countersink_d, h=countersink_depth + 0.1);
                }
        }
    }
}

faceplate();
